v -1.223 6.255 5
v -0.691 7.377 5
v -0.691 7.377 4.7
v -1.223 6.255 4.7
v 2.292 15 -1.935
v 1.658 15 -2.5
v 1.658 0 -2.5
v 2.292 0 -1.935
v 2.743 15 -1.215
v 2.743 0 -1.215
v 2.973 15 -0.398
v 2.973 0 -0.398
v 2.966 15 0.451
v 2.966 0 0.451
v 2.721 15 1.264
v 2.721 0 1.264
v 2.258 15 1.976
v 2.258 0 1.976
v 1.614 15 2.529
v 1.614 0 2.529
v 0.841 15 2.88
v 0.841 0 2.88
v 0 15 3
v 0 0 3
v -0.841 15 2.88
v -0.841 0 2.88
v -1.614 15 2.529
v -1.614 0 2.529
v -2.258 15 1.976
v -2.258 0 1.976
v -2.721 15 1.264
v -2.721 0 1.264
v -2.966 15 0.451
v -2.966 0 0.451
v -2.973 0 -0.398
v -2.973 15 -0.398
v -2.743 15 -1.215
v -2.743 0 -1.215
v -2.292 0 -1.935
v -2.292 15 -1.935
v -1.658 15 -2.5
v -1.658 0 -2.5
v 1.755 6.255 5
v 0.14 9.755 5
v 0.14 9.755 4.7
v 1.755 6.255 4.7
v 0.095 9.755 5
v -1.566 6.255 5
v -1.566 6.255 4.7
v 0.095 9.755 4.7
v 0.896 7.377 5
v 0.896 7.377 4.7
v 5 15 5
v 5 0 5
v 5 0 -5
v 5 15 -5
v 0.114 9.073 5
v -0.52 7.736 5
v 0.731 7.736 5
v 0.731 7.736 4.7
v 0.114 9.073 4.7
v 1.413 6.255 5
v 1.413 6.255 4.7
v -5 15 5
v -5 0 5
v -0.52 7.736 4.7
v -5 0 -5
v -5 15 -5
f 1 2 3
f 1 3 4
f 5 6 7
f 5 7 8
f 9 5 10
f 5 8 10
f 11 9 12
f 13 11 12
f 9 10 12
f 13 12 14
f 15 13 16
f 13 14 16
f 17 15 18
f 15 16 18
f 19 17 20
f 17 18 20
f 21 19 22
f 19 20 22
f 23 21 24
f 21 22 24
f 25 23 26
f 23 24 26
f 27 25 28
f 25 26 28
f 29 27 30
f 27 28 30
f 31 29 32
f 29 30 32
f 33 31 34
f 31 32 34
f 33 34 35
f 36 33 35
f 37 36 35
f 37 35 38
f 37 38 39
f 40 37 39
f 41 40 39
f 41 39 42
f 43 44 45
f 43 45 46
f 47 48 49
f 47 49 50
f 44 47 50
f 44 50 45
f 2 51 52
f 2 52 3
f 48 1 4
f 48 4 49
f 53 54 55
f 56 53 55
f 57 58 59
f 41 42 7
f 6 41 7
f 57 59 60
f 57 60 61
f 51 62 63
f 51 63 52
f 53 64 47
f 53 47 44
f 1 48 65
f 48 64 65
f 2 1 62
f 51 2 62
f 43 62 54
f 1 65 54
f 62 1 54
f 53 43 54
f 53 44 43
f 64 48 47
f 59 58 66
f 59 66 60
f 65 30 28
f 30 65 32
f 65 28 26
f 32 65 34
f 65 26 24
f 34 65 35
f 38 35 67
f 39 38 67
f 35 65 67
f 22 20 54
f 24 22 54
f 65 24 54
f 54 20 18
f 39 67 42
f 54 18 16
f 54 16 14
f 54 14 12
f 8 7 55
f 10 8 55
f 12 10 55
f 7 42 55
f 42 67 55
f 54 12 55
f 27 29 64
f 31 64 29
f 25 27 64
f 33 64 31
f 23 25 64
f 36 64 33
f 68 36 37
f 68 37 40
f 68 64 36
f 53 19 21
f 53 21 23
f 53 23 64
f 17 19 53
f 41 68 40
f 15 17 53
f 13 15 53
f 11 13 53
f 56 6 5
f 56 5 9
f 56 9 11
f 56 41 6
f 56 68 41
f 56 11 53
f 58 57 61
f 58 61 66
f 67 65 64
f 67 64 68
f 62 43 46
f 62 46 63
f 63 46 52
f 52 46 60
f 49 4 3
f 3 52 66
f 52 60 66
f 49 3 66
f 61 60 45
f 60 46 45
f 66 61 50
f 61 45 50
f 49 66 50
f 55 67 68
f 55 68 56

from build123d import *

# Parameters (mm, degrees)
SKETCH1_W           = 10
SKETCH1_H           = 10
BOSS_EXTRUDE1_DEPTH = 15
CUT_EXTRUDE1_DEPTH  = 0.3


with BuildPart() as part:
    # Sketch1 → Boss-Extrude1 (new body)
    with BuildSketch(Plane(origin=(0, 0, 0), x_dir=(1, 0, 0), z_dir=(0, 1, 0))):
        Rectangle(SKETCH1_W, SKETCH1_H)
        with BuildLine():
            Line((-1.658312395, 2.5), (1.658312395, 2.5))
            ThreePointArc((1.658312395, 2.5), (0, -3), (-1.658312395, 2.5))
        make_face(mode=Mode.SUBTRACT)
    extrude(amount=BOSS_EXTRUDE1_DEPTH)

    # Sketch2 → Cut-Extrude1 (cut)
    with BuildSketch(Plane.XY.offset(5)):
        Polygon((0.139535008, 9.754838654), (1.754919623, 6.254838654), (1.413473309, 6.254838654), (0.896045424, 7.376633526), (-0.690593197, 7.376633526), (-1.22274464, 6.254838654), (-1.565593197, 6.254838654), (0.094663213, 9.754838654), align=None)
        Polygon((0.113593501, 9.072647148), (-0.520220601, 7.735607885), (0.730580681, 7.735607885), align=None, mode=Mode.SUBTRACT)
    extrude(amount=-CUT_EXTRUDE1_DEPTH, mode=Mode.SUBTRACT)


solid = part.part
